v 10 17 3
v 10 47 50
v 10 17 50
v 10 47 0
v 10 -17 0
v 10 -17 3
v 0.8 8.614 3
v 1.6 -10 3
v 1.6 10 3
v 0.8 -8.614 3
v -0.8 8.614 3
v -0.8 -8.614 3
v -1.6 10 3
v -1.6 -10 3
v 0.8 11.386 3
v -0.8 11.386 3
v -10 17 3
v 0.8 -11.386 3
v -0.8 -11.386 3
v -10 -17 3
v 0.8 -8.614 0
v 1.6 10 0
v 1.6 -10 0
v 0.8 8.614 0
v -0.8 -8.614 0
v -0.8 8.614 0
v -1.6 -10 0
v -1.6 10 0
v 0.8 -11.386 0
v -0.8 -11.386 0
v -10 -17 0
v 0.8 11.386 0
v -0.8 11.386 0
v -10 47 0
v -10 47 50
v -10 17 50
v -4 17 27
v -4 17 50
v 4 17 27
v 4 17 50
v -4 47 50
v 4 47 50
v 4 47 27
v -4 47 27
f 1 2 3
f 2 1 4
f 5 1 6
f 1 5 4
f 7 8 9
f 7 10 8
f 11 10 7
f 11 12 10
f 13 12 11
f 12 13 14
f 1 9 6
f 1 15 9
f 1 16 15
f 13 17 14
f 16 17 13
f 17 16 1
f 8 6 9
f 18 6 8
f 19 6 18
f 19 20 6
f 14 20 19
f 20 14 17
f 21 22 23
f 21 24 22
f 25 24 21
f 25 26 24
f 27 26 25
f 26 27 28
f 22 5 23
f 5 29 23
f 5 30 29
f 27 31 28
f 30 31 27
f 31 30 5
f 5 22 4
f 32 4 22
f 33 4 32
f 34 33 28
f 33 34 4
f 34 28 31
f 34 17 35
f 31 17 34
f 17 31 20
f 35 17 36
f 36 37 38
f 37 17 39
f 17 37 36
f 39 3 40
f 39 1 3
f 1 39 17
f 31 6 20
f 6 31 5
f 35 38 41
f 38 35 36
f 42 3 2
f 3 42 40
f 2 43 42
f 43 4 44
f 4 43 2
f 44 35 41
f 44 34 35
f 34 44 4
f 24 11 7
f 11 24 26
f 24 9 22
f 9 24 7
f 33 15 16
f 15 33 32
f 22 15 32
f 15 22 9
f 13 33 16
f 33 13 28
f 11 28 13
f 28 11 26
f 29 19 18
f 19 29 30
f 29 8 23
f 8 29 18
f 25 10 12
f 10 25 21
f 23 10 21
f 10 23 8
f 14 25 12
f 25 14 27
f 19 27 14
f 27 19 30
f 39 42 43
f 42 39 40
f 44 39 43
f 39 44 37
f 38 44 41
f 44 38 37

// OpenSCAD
// file: pliers-lib.scad
module mounting_screw(length) {
    screw_diameter = 3.2;
    head_diameter = 5.2;
    head_length = 2.5;

    cylinder(d=screw_diameter, h=length);
    cylinder(d=head_diameter, h=head_length);
}

module plier_divider_screws(height) {
    distance_between_holes = 40;

    translate([0,distance_between_holes/2,0])
    mounting_screw(height);

    translate([0,-distance_between_holes/2,0])
    mounting_screw(height);
}

module plier_divider() {
    mount_thickness = 3;
    mount_width = 8;
    mount_length = 50;
    divider_thickness = 8;
    divider_height = 96; // from bottom not from mount
    divider_circle_height = 100;// the circle center point has this height
    divider_length = 27;

    difference() {
        union() {
            // Mount
            translate([0,0,mount_thickness/2])
            cube([mount_width,mount_length,mount_thickness], center=true);

            // Divider rectangle
            translate([0,0,(divider_circle_height-divider_length/2)/2])
            cube([divider_thickness,divider_length,divider_circle_height-divider_length/2], center=true);

            // Divider top circle
            translate([-divider_thickness/2,0,divider_circle_height-divider_length/2])
            rotate([0,90,0])
            #cylinder(d=divider_length, h=divider_thickness);
        }

        union() {
            translate([0,0,-12/2])
            #plier_divider_screws(12);

            translate([0,0,divider_height+divider_length/4])
            #cube([divider_thickness,divider_length,divider_length/2], center=true);
        }
    }
}

module plier_stand_screws(height) {
    distance_between_holes = 20;

    translate([0,distance_between_holes/2,0])
    mounting_screw(height);

    translate([0,-distance_between_holes/2,0])
    mounting_screw(height);
}

module plier_stand() {
    width = 20;

    mount_thickness = 3;
    mount_length = 34;
    stand_height = 50; // from bottom not from mount
    stand_length = 30;
    height = 12;

    difference() {
        union() {
            translate([0,0,mount_thickness/2])
            #cube([width,mount_length,mount_thickness], center=true);

            translate([0,stand_length+(mount_length-stand_length)/2,stand_height/2])
            cube([width,stand_length,stand_height], center=true);
        }

        translate([0,0,-height/2])
        plier_stand_screws(height);
    }
}
// main file
include <pliers-lib.scad>

// TODO:
difference() {
  plier_stand();

  union() {
    width = 30;
    height_to_plier = 27;
    height = 50-height_to_plier;
    translate([0, 47-width/2, height_to_plier + height/2])
    #cube([8, width, height], center=true);
  }
}
